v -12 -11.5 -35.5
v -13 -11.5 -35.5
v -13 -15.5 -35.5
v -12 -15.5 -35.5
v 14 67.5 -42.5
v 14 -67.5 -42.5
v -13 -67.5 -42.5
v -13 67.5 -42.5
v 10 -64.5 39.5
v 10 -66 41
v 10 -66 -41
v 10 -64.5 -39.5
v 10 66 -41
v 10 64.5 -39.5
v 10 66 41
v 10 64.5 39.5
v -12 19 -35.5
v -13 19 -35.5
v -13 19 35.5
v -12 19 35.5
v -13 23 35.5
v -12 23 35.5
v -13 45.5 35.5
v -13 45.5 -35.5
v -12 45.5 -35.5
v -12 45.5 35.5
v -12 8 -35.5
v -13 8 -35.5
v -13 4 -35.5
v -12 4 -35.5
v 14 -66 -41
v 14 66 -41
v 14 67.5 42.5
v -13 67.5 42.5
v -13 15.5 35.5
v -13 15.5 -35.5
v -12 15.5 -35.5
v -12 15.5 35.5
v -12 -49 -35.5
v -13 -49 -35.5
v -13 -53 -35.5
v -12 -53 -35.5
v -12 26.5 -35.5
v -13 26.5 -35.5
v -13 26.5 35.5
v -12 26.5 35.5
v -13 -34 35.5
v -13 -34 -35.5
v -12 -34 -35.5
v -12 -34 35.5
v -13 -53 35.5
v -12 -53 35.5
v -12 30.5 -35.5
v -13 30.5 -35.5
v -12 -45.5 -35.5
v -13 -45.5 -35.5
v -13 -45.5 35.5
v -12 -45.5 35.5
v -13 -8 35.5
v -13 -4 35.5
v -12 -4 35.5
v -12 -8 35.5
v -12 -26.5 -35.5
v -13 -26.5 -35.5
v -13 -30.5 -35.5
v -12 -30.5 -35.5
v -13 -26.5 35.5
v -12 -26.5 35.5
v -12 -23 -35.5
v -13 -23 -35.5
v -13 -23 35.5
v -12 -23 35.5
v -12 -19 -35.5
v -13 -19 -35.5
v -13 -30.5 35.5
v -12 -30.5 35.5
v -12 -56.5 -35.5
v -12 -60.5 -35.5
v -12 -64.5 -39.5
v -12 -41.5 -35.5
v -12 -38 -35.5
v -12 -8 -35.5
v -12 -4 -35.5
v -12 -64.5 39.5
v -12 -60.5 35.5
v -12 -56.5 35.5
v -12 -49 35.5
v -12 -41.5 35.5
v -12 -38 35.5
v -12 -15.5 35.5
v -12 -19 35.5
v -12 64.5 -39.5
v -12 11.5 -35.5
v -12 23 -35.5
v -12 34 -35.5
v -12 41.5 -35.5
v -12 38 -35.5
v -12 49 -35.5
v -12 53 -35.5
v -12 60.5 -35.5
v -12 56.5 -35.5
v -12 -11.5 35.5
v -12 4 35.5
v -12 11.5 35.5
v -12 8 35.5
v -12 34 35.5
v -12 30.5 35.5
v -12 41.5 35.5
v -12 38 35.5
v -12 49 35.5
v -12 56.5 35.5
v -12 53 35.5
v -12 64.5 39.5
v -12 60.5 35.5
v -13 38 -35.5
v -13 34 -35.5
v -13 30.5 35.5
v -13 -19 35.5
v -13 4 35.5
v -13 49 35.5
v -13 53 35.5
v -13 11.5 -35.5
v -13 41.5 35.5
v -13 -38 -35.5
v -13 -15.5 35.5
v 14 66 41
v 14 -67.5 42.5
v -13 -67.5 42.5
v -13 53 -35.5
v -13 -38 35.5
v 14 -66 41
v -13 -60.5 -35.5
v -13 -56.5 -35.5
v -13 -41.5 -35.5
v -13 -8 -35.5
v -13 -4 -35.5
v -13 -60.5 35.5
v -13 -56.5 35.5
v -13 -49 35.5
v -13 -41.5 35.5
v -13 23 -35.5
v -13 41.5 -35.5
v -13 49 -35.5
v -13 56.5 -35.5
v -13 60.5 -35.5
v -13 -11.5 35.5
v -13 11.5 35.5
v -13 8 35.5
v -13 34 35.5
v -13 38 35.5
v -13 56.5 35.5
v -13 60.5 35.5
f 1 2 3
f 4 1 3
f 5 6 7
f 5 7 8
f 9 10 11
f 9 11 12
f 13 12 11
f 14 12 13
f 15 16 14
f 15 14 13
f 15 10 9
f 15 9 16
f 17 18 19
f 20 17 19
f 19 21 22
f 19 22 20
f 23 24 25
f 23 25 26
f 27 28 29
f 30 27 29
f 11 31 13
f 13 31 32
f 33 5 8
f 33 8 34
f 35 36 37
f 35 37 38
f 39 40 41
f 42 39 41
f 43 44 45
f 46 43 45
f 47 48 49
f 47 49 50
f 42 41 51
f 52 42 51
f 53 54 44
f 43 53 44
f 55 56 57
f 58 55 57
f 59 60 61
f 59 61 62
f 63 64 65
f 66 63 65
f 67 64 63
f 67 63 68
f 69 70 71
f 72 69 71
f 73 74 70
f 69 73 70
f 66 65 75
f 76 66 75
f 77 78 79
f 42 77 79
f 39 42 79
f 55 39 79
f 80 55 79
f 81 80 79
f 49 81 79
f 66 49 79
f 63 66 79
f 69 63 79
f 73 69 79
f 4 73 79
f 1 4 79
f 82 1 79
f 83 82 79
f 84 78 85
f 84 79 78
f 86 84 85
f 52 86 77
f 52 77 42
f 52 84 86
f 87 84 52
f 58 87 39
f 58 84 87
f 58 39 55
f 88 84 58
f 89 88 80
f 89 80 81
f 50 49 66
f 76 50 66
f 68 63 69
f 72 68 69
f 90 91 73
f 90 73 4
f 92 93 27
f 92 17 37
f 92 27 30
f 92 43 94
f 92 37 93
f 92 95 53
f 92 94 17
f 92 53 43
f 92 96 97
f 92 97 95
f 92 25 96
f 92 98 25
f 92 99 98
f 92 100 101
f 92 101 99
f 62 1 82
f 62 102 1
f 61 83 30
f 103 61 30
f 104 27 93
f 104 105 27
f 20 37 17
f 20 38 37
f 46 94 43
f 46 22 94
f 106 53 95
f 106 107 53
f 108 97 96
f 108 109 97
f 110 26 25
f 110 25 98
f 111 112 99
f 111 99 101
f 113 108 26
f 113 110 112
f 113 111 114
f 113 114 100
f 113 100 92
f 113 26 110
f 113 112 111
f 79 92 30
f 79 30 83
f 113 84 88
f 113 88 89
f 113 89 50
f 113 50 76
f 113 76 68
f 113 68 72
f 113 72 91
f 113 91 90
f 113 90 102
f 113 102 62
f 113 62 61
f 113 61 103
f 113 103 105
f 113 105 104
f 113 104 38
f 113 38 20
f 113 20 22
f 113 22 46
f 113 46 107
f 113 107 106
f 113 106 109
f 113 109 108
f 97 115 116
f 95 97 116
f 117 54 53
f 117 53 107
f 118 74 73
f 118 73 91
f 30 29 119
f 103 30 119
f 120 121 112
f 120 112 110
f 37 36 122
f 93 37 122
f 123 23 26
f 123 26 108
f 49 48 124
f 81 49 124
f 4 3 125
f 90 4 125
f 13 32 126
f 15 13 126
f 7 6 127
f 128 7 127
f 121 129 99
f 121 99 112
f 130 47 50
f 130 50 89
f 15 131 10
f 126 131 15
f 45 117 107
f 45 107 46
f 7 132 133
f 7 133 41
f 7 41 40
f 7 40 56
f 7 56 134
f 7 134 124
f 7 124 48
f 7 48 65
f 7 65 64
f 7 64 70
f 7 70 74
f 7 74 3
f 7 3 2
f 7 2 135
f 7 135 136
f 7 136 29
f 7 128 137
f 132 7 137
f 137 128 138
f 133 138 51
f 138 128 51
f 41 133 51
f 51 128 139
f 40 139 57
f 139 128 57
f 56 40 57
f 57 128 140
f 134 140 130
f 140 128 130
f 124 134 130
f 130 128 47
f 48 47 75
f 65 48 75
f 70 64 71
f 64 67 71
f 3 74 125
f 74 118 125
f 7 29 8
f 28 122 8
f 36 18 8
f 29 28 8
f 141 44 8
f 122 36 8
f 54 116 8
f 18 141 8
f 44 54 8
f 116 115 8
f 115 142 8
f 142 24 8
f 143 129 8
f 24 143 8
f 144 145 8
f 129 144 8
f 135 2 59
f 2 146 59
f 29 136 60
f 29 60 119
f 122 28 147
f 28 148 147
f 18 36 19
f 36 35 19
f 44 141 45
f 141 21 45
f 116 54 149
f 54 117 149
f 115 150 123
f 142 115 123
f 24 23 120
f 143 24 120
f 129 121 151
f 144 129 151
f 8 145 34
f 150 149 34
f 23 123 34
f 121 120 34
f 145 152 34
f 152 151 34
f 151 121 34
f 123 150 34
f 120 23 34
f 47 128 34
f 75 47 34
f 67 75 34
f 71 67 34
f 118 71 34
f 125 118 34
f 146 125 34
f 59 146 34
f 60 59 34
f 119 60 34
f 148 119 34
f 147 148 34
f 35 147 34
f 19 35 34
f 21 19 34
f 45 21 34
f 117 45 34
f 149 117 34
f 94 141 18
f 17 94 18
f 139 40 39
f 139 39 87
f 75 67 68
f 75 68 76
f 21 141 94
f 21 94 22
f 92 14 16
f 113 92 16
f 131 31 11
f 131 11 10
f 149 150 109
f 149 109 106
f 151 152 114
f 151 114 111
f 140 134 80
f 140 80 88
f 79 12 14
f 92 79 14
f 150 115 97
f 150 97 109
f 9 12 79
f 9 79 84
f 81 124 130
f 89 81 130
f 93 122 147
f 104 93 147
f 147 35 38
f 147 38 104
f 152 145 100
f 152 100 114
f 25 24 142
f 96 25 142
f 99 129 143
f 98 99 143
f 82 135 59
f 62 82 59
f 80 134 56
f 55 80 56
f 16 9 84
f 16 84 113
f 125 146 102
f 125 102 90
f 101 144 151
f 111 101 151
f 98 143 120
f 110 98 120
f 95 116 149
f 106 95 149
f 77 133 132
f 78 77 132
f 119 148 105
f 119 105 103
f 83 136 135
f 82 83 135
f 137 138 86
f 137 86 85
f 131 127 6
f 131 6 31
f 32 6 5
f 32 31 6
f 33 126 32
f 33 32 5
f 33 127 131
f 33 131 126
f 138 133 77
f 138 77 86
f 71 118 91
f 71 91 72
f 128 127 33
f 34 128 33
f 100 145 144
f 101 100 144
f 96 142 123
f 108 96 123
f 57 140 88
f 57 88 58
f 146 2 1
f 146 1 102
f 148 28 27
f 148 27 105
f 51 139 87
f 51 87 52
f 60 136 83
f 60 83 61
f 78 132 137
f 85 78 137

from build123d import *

# Parameters (mm, degrees)
F0_W     = 135
F0_H     = 85
F1_DEPTH = 14
F2_W     = 129
F2_H     = 79
F3_DEPTH = 26
F4_W     = 132
F4_H     = 82
F4_W_2   = 129
F4_H_2   = 79
F5_DEPTH = 3
F6_W     = 4
F6_H     = 71
F7_DEPTH = 25
F8_DEPTH = 1
F9_DEPTH = 1


with BuildPart() as f1:
    # F0 (on Right) → F1 (new body, symmetric)
    with BuildSketch(Plane.YZ):
        Rectangle(F0_W, F0_H)
    extrude(amount=F1_DEPTH, both=True)

    # F2 (on face) → F3 (cut)
    with BuildSketch(Plane.YZ.offset(14)):
        Rectangle(F2_W, F2_H)
    extrude(amount=-F3_DEPTH, mode=Mode.SUBTRACT)

    # F4 (on face) → F5 (cut)
    with BuildSketch(Plane.YZ.offset(14)):
        Rectangle(F4_W, F4_H)
        Rectangle(F4_W_2, F4_H_2, mode=Mode.SUBTRACT)
    extrude(amount=-F5_DEPTH, mode=Mode.SUBTRACT)

    # F6 (on face) → F7 (cut)
    with BuildSketch(Plane(origin=(-14, 0, 0), x_dir=(0, -1, 0), z_dir=(-1, 0, 0))):
        with Locations((-58.5, 0)):
            Rectangle(F6_W, F6_H)
        with Locations((-51, 0)):
            Rectangle(F6_W, F6_H)
        with Locations((-43.5, 0)):
            Rectangle(F6_W, F6_H)
        with Locations((-36, 0)):
            Rectangle(F6_W, F6_H)
        with Locations((-28.5, 0)):
            Rectangle(F6_W, F6_H)
        with Locations((-21, 0)):
            Rectangle(F6_W, F6_H)
        with Locations((-13.5, 0)):
            Rectangle(F6_W, F6_H)
        with Locations((-6, 0)):
            Rectangle(F6_W, F6_H)
        with Locations((43.5, 0)):
            Rectangle(F6_W, F6_H)
        with Locations((21, 0)):
            Rectangle(F6_W, F6_H)
        with Locations((28.5, 0)):
            Rectangle(F6_W, F6_H)
        with Locations((13.5, 0)):
            Rectangle(F6_W, F6_H)
        with Locations((58.5, 0)):
            Rectangle(F6_W, F6_H)
        with Locations((36, 0)):
            Rectangle(F6_W, F6_H)
        with Locations((51, 0)):
            Rectangle(F6_W, F6_H)
        with Locations((6, 0)):
            Rectangle(F6_W, F6_H)
    extrude(amount=-F7_DEPTH, mode=Mode.SUBTRACT)

    # F8 (cut): a face of the model
    f8_faces = [f1.faces().sort_by_distance(p)[0] for p in [
        (-14, 0, 0),
    ]]
    extrude(f8_faces, amount=-F8_DEPTH, mode=Mode.SUBTRACT)

    # F9 (cut): a face of the model
    f9_faces = [f1.faces().sort_by_distance(p)[0] for p in [
        (11, 0, 40.8446037323),
    ]]
    extrude(f9_faces, amount=-F9_DEPTH, mode=Mode.SUBTRACT)


solid = f1.part
